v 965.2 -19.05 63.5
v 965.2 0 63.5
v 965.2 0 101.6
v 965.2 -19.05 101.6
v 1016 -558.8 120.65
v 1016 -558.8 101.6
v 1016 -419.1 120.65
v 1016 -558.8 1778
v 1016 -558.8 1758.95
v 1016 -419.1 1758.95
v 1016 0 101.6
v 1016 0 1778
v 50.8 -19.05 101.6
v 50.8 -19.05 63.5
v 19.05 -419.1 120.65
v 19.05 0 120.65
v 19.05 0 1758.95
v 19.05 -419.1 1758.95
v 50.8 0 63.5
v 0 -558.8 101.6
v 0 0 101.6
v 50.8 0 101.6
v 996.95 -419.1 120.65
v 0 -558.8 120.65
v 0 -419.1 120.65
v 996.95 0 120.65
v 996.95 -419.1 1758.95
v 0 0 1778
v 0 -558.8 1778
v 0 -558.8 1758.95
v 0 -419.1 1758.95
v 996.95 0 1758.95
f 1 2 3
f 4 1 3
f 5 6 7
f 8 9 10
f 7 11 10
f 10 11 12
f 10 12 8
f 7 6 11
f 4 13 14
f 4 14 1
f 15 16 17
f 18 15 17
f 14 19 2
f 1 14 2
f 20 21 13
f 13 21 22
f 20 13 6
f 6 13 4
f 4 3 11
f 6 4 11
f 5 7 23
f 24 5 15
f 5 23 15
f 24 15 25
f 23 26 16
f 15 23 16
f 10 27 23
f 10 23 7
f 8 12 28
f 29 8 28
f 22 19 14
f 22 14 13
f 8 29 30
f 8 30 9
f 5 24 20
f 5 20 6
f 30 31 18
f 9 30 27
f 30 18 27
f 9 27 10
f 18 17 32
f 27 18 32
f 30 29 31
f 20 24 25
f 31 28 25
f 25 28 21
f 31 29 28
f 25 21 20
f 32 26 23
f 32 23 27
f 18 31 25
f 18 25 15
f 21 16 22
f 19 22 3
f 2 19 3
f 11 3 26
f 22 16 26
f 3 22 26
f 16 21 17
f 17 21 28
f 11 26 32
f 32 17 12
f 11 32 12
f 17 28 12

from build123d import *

# Parameters (mm, degrees)
F1_DEPTH = 558.8
F0_W     = 19.05
F0_H     = 1638.3
F2_DEPTH = 419.1
F3_DEPTH = 558.8
F0_W_2   = 914.4
F0_H_2   = 38.1
F4_DEPTH = 19.05


with BuildPart() as f1:
    # F0 (on Front) → F1 (new body)
    with BuildSketch(Plane.XZ):
        Polygon((0, 120.65), (0, 101.6), (50.8, 101.6), (965.2, 101.6), (1016, 101.6), (1016, 120.65), (996.95, 120.65), (19.05, 120.65), align=None)
    extrude(amount=F1_DEPTH)

    # F0 (on Front) → F2 (join)
    with BuildSketch(Plane.XZ):
        with Locations((1006.475, 939.8)):
            Rectangle(F0_W, F0_H)
        with Locations((9.525, 939.8)):
            Rectangle(F0_W, F0_H)
    extrude(amount=F2_DEPTH)

    # F0 (on Front) → F3 (join)
    with BuildSketch(Plane.XZ):
        Polygon((0, 1778), (0, 1758.95), (19.05, 1758.95), (996.95, 1758.95), (1016, 1758.95), (1016, 1778), align=None)
    extrude(amount=F3_DEPTH)

    # F0 (on Front) → F4 (join)
    with BuildSketch(Plane.XZ):
        with Locations((508, 82.55)):
            Rectangle(F0_W_2, F0_H_2)
    extrude(amount=F4_DEPTH)


solid = f1.part
